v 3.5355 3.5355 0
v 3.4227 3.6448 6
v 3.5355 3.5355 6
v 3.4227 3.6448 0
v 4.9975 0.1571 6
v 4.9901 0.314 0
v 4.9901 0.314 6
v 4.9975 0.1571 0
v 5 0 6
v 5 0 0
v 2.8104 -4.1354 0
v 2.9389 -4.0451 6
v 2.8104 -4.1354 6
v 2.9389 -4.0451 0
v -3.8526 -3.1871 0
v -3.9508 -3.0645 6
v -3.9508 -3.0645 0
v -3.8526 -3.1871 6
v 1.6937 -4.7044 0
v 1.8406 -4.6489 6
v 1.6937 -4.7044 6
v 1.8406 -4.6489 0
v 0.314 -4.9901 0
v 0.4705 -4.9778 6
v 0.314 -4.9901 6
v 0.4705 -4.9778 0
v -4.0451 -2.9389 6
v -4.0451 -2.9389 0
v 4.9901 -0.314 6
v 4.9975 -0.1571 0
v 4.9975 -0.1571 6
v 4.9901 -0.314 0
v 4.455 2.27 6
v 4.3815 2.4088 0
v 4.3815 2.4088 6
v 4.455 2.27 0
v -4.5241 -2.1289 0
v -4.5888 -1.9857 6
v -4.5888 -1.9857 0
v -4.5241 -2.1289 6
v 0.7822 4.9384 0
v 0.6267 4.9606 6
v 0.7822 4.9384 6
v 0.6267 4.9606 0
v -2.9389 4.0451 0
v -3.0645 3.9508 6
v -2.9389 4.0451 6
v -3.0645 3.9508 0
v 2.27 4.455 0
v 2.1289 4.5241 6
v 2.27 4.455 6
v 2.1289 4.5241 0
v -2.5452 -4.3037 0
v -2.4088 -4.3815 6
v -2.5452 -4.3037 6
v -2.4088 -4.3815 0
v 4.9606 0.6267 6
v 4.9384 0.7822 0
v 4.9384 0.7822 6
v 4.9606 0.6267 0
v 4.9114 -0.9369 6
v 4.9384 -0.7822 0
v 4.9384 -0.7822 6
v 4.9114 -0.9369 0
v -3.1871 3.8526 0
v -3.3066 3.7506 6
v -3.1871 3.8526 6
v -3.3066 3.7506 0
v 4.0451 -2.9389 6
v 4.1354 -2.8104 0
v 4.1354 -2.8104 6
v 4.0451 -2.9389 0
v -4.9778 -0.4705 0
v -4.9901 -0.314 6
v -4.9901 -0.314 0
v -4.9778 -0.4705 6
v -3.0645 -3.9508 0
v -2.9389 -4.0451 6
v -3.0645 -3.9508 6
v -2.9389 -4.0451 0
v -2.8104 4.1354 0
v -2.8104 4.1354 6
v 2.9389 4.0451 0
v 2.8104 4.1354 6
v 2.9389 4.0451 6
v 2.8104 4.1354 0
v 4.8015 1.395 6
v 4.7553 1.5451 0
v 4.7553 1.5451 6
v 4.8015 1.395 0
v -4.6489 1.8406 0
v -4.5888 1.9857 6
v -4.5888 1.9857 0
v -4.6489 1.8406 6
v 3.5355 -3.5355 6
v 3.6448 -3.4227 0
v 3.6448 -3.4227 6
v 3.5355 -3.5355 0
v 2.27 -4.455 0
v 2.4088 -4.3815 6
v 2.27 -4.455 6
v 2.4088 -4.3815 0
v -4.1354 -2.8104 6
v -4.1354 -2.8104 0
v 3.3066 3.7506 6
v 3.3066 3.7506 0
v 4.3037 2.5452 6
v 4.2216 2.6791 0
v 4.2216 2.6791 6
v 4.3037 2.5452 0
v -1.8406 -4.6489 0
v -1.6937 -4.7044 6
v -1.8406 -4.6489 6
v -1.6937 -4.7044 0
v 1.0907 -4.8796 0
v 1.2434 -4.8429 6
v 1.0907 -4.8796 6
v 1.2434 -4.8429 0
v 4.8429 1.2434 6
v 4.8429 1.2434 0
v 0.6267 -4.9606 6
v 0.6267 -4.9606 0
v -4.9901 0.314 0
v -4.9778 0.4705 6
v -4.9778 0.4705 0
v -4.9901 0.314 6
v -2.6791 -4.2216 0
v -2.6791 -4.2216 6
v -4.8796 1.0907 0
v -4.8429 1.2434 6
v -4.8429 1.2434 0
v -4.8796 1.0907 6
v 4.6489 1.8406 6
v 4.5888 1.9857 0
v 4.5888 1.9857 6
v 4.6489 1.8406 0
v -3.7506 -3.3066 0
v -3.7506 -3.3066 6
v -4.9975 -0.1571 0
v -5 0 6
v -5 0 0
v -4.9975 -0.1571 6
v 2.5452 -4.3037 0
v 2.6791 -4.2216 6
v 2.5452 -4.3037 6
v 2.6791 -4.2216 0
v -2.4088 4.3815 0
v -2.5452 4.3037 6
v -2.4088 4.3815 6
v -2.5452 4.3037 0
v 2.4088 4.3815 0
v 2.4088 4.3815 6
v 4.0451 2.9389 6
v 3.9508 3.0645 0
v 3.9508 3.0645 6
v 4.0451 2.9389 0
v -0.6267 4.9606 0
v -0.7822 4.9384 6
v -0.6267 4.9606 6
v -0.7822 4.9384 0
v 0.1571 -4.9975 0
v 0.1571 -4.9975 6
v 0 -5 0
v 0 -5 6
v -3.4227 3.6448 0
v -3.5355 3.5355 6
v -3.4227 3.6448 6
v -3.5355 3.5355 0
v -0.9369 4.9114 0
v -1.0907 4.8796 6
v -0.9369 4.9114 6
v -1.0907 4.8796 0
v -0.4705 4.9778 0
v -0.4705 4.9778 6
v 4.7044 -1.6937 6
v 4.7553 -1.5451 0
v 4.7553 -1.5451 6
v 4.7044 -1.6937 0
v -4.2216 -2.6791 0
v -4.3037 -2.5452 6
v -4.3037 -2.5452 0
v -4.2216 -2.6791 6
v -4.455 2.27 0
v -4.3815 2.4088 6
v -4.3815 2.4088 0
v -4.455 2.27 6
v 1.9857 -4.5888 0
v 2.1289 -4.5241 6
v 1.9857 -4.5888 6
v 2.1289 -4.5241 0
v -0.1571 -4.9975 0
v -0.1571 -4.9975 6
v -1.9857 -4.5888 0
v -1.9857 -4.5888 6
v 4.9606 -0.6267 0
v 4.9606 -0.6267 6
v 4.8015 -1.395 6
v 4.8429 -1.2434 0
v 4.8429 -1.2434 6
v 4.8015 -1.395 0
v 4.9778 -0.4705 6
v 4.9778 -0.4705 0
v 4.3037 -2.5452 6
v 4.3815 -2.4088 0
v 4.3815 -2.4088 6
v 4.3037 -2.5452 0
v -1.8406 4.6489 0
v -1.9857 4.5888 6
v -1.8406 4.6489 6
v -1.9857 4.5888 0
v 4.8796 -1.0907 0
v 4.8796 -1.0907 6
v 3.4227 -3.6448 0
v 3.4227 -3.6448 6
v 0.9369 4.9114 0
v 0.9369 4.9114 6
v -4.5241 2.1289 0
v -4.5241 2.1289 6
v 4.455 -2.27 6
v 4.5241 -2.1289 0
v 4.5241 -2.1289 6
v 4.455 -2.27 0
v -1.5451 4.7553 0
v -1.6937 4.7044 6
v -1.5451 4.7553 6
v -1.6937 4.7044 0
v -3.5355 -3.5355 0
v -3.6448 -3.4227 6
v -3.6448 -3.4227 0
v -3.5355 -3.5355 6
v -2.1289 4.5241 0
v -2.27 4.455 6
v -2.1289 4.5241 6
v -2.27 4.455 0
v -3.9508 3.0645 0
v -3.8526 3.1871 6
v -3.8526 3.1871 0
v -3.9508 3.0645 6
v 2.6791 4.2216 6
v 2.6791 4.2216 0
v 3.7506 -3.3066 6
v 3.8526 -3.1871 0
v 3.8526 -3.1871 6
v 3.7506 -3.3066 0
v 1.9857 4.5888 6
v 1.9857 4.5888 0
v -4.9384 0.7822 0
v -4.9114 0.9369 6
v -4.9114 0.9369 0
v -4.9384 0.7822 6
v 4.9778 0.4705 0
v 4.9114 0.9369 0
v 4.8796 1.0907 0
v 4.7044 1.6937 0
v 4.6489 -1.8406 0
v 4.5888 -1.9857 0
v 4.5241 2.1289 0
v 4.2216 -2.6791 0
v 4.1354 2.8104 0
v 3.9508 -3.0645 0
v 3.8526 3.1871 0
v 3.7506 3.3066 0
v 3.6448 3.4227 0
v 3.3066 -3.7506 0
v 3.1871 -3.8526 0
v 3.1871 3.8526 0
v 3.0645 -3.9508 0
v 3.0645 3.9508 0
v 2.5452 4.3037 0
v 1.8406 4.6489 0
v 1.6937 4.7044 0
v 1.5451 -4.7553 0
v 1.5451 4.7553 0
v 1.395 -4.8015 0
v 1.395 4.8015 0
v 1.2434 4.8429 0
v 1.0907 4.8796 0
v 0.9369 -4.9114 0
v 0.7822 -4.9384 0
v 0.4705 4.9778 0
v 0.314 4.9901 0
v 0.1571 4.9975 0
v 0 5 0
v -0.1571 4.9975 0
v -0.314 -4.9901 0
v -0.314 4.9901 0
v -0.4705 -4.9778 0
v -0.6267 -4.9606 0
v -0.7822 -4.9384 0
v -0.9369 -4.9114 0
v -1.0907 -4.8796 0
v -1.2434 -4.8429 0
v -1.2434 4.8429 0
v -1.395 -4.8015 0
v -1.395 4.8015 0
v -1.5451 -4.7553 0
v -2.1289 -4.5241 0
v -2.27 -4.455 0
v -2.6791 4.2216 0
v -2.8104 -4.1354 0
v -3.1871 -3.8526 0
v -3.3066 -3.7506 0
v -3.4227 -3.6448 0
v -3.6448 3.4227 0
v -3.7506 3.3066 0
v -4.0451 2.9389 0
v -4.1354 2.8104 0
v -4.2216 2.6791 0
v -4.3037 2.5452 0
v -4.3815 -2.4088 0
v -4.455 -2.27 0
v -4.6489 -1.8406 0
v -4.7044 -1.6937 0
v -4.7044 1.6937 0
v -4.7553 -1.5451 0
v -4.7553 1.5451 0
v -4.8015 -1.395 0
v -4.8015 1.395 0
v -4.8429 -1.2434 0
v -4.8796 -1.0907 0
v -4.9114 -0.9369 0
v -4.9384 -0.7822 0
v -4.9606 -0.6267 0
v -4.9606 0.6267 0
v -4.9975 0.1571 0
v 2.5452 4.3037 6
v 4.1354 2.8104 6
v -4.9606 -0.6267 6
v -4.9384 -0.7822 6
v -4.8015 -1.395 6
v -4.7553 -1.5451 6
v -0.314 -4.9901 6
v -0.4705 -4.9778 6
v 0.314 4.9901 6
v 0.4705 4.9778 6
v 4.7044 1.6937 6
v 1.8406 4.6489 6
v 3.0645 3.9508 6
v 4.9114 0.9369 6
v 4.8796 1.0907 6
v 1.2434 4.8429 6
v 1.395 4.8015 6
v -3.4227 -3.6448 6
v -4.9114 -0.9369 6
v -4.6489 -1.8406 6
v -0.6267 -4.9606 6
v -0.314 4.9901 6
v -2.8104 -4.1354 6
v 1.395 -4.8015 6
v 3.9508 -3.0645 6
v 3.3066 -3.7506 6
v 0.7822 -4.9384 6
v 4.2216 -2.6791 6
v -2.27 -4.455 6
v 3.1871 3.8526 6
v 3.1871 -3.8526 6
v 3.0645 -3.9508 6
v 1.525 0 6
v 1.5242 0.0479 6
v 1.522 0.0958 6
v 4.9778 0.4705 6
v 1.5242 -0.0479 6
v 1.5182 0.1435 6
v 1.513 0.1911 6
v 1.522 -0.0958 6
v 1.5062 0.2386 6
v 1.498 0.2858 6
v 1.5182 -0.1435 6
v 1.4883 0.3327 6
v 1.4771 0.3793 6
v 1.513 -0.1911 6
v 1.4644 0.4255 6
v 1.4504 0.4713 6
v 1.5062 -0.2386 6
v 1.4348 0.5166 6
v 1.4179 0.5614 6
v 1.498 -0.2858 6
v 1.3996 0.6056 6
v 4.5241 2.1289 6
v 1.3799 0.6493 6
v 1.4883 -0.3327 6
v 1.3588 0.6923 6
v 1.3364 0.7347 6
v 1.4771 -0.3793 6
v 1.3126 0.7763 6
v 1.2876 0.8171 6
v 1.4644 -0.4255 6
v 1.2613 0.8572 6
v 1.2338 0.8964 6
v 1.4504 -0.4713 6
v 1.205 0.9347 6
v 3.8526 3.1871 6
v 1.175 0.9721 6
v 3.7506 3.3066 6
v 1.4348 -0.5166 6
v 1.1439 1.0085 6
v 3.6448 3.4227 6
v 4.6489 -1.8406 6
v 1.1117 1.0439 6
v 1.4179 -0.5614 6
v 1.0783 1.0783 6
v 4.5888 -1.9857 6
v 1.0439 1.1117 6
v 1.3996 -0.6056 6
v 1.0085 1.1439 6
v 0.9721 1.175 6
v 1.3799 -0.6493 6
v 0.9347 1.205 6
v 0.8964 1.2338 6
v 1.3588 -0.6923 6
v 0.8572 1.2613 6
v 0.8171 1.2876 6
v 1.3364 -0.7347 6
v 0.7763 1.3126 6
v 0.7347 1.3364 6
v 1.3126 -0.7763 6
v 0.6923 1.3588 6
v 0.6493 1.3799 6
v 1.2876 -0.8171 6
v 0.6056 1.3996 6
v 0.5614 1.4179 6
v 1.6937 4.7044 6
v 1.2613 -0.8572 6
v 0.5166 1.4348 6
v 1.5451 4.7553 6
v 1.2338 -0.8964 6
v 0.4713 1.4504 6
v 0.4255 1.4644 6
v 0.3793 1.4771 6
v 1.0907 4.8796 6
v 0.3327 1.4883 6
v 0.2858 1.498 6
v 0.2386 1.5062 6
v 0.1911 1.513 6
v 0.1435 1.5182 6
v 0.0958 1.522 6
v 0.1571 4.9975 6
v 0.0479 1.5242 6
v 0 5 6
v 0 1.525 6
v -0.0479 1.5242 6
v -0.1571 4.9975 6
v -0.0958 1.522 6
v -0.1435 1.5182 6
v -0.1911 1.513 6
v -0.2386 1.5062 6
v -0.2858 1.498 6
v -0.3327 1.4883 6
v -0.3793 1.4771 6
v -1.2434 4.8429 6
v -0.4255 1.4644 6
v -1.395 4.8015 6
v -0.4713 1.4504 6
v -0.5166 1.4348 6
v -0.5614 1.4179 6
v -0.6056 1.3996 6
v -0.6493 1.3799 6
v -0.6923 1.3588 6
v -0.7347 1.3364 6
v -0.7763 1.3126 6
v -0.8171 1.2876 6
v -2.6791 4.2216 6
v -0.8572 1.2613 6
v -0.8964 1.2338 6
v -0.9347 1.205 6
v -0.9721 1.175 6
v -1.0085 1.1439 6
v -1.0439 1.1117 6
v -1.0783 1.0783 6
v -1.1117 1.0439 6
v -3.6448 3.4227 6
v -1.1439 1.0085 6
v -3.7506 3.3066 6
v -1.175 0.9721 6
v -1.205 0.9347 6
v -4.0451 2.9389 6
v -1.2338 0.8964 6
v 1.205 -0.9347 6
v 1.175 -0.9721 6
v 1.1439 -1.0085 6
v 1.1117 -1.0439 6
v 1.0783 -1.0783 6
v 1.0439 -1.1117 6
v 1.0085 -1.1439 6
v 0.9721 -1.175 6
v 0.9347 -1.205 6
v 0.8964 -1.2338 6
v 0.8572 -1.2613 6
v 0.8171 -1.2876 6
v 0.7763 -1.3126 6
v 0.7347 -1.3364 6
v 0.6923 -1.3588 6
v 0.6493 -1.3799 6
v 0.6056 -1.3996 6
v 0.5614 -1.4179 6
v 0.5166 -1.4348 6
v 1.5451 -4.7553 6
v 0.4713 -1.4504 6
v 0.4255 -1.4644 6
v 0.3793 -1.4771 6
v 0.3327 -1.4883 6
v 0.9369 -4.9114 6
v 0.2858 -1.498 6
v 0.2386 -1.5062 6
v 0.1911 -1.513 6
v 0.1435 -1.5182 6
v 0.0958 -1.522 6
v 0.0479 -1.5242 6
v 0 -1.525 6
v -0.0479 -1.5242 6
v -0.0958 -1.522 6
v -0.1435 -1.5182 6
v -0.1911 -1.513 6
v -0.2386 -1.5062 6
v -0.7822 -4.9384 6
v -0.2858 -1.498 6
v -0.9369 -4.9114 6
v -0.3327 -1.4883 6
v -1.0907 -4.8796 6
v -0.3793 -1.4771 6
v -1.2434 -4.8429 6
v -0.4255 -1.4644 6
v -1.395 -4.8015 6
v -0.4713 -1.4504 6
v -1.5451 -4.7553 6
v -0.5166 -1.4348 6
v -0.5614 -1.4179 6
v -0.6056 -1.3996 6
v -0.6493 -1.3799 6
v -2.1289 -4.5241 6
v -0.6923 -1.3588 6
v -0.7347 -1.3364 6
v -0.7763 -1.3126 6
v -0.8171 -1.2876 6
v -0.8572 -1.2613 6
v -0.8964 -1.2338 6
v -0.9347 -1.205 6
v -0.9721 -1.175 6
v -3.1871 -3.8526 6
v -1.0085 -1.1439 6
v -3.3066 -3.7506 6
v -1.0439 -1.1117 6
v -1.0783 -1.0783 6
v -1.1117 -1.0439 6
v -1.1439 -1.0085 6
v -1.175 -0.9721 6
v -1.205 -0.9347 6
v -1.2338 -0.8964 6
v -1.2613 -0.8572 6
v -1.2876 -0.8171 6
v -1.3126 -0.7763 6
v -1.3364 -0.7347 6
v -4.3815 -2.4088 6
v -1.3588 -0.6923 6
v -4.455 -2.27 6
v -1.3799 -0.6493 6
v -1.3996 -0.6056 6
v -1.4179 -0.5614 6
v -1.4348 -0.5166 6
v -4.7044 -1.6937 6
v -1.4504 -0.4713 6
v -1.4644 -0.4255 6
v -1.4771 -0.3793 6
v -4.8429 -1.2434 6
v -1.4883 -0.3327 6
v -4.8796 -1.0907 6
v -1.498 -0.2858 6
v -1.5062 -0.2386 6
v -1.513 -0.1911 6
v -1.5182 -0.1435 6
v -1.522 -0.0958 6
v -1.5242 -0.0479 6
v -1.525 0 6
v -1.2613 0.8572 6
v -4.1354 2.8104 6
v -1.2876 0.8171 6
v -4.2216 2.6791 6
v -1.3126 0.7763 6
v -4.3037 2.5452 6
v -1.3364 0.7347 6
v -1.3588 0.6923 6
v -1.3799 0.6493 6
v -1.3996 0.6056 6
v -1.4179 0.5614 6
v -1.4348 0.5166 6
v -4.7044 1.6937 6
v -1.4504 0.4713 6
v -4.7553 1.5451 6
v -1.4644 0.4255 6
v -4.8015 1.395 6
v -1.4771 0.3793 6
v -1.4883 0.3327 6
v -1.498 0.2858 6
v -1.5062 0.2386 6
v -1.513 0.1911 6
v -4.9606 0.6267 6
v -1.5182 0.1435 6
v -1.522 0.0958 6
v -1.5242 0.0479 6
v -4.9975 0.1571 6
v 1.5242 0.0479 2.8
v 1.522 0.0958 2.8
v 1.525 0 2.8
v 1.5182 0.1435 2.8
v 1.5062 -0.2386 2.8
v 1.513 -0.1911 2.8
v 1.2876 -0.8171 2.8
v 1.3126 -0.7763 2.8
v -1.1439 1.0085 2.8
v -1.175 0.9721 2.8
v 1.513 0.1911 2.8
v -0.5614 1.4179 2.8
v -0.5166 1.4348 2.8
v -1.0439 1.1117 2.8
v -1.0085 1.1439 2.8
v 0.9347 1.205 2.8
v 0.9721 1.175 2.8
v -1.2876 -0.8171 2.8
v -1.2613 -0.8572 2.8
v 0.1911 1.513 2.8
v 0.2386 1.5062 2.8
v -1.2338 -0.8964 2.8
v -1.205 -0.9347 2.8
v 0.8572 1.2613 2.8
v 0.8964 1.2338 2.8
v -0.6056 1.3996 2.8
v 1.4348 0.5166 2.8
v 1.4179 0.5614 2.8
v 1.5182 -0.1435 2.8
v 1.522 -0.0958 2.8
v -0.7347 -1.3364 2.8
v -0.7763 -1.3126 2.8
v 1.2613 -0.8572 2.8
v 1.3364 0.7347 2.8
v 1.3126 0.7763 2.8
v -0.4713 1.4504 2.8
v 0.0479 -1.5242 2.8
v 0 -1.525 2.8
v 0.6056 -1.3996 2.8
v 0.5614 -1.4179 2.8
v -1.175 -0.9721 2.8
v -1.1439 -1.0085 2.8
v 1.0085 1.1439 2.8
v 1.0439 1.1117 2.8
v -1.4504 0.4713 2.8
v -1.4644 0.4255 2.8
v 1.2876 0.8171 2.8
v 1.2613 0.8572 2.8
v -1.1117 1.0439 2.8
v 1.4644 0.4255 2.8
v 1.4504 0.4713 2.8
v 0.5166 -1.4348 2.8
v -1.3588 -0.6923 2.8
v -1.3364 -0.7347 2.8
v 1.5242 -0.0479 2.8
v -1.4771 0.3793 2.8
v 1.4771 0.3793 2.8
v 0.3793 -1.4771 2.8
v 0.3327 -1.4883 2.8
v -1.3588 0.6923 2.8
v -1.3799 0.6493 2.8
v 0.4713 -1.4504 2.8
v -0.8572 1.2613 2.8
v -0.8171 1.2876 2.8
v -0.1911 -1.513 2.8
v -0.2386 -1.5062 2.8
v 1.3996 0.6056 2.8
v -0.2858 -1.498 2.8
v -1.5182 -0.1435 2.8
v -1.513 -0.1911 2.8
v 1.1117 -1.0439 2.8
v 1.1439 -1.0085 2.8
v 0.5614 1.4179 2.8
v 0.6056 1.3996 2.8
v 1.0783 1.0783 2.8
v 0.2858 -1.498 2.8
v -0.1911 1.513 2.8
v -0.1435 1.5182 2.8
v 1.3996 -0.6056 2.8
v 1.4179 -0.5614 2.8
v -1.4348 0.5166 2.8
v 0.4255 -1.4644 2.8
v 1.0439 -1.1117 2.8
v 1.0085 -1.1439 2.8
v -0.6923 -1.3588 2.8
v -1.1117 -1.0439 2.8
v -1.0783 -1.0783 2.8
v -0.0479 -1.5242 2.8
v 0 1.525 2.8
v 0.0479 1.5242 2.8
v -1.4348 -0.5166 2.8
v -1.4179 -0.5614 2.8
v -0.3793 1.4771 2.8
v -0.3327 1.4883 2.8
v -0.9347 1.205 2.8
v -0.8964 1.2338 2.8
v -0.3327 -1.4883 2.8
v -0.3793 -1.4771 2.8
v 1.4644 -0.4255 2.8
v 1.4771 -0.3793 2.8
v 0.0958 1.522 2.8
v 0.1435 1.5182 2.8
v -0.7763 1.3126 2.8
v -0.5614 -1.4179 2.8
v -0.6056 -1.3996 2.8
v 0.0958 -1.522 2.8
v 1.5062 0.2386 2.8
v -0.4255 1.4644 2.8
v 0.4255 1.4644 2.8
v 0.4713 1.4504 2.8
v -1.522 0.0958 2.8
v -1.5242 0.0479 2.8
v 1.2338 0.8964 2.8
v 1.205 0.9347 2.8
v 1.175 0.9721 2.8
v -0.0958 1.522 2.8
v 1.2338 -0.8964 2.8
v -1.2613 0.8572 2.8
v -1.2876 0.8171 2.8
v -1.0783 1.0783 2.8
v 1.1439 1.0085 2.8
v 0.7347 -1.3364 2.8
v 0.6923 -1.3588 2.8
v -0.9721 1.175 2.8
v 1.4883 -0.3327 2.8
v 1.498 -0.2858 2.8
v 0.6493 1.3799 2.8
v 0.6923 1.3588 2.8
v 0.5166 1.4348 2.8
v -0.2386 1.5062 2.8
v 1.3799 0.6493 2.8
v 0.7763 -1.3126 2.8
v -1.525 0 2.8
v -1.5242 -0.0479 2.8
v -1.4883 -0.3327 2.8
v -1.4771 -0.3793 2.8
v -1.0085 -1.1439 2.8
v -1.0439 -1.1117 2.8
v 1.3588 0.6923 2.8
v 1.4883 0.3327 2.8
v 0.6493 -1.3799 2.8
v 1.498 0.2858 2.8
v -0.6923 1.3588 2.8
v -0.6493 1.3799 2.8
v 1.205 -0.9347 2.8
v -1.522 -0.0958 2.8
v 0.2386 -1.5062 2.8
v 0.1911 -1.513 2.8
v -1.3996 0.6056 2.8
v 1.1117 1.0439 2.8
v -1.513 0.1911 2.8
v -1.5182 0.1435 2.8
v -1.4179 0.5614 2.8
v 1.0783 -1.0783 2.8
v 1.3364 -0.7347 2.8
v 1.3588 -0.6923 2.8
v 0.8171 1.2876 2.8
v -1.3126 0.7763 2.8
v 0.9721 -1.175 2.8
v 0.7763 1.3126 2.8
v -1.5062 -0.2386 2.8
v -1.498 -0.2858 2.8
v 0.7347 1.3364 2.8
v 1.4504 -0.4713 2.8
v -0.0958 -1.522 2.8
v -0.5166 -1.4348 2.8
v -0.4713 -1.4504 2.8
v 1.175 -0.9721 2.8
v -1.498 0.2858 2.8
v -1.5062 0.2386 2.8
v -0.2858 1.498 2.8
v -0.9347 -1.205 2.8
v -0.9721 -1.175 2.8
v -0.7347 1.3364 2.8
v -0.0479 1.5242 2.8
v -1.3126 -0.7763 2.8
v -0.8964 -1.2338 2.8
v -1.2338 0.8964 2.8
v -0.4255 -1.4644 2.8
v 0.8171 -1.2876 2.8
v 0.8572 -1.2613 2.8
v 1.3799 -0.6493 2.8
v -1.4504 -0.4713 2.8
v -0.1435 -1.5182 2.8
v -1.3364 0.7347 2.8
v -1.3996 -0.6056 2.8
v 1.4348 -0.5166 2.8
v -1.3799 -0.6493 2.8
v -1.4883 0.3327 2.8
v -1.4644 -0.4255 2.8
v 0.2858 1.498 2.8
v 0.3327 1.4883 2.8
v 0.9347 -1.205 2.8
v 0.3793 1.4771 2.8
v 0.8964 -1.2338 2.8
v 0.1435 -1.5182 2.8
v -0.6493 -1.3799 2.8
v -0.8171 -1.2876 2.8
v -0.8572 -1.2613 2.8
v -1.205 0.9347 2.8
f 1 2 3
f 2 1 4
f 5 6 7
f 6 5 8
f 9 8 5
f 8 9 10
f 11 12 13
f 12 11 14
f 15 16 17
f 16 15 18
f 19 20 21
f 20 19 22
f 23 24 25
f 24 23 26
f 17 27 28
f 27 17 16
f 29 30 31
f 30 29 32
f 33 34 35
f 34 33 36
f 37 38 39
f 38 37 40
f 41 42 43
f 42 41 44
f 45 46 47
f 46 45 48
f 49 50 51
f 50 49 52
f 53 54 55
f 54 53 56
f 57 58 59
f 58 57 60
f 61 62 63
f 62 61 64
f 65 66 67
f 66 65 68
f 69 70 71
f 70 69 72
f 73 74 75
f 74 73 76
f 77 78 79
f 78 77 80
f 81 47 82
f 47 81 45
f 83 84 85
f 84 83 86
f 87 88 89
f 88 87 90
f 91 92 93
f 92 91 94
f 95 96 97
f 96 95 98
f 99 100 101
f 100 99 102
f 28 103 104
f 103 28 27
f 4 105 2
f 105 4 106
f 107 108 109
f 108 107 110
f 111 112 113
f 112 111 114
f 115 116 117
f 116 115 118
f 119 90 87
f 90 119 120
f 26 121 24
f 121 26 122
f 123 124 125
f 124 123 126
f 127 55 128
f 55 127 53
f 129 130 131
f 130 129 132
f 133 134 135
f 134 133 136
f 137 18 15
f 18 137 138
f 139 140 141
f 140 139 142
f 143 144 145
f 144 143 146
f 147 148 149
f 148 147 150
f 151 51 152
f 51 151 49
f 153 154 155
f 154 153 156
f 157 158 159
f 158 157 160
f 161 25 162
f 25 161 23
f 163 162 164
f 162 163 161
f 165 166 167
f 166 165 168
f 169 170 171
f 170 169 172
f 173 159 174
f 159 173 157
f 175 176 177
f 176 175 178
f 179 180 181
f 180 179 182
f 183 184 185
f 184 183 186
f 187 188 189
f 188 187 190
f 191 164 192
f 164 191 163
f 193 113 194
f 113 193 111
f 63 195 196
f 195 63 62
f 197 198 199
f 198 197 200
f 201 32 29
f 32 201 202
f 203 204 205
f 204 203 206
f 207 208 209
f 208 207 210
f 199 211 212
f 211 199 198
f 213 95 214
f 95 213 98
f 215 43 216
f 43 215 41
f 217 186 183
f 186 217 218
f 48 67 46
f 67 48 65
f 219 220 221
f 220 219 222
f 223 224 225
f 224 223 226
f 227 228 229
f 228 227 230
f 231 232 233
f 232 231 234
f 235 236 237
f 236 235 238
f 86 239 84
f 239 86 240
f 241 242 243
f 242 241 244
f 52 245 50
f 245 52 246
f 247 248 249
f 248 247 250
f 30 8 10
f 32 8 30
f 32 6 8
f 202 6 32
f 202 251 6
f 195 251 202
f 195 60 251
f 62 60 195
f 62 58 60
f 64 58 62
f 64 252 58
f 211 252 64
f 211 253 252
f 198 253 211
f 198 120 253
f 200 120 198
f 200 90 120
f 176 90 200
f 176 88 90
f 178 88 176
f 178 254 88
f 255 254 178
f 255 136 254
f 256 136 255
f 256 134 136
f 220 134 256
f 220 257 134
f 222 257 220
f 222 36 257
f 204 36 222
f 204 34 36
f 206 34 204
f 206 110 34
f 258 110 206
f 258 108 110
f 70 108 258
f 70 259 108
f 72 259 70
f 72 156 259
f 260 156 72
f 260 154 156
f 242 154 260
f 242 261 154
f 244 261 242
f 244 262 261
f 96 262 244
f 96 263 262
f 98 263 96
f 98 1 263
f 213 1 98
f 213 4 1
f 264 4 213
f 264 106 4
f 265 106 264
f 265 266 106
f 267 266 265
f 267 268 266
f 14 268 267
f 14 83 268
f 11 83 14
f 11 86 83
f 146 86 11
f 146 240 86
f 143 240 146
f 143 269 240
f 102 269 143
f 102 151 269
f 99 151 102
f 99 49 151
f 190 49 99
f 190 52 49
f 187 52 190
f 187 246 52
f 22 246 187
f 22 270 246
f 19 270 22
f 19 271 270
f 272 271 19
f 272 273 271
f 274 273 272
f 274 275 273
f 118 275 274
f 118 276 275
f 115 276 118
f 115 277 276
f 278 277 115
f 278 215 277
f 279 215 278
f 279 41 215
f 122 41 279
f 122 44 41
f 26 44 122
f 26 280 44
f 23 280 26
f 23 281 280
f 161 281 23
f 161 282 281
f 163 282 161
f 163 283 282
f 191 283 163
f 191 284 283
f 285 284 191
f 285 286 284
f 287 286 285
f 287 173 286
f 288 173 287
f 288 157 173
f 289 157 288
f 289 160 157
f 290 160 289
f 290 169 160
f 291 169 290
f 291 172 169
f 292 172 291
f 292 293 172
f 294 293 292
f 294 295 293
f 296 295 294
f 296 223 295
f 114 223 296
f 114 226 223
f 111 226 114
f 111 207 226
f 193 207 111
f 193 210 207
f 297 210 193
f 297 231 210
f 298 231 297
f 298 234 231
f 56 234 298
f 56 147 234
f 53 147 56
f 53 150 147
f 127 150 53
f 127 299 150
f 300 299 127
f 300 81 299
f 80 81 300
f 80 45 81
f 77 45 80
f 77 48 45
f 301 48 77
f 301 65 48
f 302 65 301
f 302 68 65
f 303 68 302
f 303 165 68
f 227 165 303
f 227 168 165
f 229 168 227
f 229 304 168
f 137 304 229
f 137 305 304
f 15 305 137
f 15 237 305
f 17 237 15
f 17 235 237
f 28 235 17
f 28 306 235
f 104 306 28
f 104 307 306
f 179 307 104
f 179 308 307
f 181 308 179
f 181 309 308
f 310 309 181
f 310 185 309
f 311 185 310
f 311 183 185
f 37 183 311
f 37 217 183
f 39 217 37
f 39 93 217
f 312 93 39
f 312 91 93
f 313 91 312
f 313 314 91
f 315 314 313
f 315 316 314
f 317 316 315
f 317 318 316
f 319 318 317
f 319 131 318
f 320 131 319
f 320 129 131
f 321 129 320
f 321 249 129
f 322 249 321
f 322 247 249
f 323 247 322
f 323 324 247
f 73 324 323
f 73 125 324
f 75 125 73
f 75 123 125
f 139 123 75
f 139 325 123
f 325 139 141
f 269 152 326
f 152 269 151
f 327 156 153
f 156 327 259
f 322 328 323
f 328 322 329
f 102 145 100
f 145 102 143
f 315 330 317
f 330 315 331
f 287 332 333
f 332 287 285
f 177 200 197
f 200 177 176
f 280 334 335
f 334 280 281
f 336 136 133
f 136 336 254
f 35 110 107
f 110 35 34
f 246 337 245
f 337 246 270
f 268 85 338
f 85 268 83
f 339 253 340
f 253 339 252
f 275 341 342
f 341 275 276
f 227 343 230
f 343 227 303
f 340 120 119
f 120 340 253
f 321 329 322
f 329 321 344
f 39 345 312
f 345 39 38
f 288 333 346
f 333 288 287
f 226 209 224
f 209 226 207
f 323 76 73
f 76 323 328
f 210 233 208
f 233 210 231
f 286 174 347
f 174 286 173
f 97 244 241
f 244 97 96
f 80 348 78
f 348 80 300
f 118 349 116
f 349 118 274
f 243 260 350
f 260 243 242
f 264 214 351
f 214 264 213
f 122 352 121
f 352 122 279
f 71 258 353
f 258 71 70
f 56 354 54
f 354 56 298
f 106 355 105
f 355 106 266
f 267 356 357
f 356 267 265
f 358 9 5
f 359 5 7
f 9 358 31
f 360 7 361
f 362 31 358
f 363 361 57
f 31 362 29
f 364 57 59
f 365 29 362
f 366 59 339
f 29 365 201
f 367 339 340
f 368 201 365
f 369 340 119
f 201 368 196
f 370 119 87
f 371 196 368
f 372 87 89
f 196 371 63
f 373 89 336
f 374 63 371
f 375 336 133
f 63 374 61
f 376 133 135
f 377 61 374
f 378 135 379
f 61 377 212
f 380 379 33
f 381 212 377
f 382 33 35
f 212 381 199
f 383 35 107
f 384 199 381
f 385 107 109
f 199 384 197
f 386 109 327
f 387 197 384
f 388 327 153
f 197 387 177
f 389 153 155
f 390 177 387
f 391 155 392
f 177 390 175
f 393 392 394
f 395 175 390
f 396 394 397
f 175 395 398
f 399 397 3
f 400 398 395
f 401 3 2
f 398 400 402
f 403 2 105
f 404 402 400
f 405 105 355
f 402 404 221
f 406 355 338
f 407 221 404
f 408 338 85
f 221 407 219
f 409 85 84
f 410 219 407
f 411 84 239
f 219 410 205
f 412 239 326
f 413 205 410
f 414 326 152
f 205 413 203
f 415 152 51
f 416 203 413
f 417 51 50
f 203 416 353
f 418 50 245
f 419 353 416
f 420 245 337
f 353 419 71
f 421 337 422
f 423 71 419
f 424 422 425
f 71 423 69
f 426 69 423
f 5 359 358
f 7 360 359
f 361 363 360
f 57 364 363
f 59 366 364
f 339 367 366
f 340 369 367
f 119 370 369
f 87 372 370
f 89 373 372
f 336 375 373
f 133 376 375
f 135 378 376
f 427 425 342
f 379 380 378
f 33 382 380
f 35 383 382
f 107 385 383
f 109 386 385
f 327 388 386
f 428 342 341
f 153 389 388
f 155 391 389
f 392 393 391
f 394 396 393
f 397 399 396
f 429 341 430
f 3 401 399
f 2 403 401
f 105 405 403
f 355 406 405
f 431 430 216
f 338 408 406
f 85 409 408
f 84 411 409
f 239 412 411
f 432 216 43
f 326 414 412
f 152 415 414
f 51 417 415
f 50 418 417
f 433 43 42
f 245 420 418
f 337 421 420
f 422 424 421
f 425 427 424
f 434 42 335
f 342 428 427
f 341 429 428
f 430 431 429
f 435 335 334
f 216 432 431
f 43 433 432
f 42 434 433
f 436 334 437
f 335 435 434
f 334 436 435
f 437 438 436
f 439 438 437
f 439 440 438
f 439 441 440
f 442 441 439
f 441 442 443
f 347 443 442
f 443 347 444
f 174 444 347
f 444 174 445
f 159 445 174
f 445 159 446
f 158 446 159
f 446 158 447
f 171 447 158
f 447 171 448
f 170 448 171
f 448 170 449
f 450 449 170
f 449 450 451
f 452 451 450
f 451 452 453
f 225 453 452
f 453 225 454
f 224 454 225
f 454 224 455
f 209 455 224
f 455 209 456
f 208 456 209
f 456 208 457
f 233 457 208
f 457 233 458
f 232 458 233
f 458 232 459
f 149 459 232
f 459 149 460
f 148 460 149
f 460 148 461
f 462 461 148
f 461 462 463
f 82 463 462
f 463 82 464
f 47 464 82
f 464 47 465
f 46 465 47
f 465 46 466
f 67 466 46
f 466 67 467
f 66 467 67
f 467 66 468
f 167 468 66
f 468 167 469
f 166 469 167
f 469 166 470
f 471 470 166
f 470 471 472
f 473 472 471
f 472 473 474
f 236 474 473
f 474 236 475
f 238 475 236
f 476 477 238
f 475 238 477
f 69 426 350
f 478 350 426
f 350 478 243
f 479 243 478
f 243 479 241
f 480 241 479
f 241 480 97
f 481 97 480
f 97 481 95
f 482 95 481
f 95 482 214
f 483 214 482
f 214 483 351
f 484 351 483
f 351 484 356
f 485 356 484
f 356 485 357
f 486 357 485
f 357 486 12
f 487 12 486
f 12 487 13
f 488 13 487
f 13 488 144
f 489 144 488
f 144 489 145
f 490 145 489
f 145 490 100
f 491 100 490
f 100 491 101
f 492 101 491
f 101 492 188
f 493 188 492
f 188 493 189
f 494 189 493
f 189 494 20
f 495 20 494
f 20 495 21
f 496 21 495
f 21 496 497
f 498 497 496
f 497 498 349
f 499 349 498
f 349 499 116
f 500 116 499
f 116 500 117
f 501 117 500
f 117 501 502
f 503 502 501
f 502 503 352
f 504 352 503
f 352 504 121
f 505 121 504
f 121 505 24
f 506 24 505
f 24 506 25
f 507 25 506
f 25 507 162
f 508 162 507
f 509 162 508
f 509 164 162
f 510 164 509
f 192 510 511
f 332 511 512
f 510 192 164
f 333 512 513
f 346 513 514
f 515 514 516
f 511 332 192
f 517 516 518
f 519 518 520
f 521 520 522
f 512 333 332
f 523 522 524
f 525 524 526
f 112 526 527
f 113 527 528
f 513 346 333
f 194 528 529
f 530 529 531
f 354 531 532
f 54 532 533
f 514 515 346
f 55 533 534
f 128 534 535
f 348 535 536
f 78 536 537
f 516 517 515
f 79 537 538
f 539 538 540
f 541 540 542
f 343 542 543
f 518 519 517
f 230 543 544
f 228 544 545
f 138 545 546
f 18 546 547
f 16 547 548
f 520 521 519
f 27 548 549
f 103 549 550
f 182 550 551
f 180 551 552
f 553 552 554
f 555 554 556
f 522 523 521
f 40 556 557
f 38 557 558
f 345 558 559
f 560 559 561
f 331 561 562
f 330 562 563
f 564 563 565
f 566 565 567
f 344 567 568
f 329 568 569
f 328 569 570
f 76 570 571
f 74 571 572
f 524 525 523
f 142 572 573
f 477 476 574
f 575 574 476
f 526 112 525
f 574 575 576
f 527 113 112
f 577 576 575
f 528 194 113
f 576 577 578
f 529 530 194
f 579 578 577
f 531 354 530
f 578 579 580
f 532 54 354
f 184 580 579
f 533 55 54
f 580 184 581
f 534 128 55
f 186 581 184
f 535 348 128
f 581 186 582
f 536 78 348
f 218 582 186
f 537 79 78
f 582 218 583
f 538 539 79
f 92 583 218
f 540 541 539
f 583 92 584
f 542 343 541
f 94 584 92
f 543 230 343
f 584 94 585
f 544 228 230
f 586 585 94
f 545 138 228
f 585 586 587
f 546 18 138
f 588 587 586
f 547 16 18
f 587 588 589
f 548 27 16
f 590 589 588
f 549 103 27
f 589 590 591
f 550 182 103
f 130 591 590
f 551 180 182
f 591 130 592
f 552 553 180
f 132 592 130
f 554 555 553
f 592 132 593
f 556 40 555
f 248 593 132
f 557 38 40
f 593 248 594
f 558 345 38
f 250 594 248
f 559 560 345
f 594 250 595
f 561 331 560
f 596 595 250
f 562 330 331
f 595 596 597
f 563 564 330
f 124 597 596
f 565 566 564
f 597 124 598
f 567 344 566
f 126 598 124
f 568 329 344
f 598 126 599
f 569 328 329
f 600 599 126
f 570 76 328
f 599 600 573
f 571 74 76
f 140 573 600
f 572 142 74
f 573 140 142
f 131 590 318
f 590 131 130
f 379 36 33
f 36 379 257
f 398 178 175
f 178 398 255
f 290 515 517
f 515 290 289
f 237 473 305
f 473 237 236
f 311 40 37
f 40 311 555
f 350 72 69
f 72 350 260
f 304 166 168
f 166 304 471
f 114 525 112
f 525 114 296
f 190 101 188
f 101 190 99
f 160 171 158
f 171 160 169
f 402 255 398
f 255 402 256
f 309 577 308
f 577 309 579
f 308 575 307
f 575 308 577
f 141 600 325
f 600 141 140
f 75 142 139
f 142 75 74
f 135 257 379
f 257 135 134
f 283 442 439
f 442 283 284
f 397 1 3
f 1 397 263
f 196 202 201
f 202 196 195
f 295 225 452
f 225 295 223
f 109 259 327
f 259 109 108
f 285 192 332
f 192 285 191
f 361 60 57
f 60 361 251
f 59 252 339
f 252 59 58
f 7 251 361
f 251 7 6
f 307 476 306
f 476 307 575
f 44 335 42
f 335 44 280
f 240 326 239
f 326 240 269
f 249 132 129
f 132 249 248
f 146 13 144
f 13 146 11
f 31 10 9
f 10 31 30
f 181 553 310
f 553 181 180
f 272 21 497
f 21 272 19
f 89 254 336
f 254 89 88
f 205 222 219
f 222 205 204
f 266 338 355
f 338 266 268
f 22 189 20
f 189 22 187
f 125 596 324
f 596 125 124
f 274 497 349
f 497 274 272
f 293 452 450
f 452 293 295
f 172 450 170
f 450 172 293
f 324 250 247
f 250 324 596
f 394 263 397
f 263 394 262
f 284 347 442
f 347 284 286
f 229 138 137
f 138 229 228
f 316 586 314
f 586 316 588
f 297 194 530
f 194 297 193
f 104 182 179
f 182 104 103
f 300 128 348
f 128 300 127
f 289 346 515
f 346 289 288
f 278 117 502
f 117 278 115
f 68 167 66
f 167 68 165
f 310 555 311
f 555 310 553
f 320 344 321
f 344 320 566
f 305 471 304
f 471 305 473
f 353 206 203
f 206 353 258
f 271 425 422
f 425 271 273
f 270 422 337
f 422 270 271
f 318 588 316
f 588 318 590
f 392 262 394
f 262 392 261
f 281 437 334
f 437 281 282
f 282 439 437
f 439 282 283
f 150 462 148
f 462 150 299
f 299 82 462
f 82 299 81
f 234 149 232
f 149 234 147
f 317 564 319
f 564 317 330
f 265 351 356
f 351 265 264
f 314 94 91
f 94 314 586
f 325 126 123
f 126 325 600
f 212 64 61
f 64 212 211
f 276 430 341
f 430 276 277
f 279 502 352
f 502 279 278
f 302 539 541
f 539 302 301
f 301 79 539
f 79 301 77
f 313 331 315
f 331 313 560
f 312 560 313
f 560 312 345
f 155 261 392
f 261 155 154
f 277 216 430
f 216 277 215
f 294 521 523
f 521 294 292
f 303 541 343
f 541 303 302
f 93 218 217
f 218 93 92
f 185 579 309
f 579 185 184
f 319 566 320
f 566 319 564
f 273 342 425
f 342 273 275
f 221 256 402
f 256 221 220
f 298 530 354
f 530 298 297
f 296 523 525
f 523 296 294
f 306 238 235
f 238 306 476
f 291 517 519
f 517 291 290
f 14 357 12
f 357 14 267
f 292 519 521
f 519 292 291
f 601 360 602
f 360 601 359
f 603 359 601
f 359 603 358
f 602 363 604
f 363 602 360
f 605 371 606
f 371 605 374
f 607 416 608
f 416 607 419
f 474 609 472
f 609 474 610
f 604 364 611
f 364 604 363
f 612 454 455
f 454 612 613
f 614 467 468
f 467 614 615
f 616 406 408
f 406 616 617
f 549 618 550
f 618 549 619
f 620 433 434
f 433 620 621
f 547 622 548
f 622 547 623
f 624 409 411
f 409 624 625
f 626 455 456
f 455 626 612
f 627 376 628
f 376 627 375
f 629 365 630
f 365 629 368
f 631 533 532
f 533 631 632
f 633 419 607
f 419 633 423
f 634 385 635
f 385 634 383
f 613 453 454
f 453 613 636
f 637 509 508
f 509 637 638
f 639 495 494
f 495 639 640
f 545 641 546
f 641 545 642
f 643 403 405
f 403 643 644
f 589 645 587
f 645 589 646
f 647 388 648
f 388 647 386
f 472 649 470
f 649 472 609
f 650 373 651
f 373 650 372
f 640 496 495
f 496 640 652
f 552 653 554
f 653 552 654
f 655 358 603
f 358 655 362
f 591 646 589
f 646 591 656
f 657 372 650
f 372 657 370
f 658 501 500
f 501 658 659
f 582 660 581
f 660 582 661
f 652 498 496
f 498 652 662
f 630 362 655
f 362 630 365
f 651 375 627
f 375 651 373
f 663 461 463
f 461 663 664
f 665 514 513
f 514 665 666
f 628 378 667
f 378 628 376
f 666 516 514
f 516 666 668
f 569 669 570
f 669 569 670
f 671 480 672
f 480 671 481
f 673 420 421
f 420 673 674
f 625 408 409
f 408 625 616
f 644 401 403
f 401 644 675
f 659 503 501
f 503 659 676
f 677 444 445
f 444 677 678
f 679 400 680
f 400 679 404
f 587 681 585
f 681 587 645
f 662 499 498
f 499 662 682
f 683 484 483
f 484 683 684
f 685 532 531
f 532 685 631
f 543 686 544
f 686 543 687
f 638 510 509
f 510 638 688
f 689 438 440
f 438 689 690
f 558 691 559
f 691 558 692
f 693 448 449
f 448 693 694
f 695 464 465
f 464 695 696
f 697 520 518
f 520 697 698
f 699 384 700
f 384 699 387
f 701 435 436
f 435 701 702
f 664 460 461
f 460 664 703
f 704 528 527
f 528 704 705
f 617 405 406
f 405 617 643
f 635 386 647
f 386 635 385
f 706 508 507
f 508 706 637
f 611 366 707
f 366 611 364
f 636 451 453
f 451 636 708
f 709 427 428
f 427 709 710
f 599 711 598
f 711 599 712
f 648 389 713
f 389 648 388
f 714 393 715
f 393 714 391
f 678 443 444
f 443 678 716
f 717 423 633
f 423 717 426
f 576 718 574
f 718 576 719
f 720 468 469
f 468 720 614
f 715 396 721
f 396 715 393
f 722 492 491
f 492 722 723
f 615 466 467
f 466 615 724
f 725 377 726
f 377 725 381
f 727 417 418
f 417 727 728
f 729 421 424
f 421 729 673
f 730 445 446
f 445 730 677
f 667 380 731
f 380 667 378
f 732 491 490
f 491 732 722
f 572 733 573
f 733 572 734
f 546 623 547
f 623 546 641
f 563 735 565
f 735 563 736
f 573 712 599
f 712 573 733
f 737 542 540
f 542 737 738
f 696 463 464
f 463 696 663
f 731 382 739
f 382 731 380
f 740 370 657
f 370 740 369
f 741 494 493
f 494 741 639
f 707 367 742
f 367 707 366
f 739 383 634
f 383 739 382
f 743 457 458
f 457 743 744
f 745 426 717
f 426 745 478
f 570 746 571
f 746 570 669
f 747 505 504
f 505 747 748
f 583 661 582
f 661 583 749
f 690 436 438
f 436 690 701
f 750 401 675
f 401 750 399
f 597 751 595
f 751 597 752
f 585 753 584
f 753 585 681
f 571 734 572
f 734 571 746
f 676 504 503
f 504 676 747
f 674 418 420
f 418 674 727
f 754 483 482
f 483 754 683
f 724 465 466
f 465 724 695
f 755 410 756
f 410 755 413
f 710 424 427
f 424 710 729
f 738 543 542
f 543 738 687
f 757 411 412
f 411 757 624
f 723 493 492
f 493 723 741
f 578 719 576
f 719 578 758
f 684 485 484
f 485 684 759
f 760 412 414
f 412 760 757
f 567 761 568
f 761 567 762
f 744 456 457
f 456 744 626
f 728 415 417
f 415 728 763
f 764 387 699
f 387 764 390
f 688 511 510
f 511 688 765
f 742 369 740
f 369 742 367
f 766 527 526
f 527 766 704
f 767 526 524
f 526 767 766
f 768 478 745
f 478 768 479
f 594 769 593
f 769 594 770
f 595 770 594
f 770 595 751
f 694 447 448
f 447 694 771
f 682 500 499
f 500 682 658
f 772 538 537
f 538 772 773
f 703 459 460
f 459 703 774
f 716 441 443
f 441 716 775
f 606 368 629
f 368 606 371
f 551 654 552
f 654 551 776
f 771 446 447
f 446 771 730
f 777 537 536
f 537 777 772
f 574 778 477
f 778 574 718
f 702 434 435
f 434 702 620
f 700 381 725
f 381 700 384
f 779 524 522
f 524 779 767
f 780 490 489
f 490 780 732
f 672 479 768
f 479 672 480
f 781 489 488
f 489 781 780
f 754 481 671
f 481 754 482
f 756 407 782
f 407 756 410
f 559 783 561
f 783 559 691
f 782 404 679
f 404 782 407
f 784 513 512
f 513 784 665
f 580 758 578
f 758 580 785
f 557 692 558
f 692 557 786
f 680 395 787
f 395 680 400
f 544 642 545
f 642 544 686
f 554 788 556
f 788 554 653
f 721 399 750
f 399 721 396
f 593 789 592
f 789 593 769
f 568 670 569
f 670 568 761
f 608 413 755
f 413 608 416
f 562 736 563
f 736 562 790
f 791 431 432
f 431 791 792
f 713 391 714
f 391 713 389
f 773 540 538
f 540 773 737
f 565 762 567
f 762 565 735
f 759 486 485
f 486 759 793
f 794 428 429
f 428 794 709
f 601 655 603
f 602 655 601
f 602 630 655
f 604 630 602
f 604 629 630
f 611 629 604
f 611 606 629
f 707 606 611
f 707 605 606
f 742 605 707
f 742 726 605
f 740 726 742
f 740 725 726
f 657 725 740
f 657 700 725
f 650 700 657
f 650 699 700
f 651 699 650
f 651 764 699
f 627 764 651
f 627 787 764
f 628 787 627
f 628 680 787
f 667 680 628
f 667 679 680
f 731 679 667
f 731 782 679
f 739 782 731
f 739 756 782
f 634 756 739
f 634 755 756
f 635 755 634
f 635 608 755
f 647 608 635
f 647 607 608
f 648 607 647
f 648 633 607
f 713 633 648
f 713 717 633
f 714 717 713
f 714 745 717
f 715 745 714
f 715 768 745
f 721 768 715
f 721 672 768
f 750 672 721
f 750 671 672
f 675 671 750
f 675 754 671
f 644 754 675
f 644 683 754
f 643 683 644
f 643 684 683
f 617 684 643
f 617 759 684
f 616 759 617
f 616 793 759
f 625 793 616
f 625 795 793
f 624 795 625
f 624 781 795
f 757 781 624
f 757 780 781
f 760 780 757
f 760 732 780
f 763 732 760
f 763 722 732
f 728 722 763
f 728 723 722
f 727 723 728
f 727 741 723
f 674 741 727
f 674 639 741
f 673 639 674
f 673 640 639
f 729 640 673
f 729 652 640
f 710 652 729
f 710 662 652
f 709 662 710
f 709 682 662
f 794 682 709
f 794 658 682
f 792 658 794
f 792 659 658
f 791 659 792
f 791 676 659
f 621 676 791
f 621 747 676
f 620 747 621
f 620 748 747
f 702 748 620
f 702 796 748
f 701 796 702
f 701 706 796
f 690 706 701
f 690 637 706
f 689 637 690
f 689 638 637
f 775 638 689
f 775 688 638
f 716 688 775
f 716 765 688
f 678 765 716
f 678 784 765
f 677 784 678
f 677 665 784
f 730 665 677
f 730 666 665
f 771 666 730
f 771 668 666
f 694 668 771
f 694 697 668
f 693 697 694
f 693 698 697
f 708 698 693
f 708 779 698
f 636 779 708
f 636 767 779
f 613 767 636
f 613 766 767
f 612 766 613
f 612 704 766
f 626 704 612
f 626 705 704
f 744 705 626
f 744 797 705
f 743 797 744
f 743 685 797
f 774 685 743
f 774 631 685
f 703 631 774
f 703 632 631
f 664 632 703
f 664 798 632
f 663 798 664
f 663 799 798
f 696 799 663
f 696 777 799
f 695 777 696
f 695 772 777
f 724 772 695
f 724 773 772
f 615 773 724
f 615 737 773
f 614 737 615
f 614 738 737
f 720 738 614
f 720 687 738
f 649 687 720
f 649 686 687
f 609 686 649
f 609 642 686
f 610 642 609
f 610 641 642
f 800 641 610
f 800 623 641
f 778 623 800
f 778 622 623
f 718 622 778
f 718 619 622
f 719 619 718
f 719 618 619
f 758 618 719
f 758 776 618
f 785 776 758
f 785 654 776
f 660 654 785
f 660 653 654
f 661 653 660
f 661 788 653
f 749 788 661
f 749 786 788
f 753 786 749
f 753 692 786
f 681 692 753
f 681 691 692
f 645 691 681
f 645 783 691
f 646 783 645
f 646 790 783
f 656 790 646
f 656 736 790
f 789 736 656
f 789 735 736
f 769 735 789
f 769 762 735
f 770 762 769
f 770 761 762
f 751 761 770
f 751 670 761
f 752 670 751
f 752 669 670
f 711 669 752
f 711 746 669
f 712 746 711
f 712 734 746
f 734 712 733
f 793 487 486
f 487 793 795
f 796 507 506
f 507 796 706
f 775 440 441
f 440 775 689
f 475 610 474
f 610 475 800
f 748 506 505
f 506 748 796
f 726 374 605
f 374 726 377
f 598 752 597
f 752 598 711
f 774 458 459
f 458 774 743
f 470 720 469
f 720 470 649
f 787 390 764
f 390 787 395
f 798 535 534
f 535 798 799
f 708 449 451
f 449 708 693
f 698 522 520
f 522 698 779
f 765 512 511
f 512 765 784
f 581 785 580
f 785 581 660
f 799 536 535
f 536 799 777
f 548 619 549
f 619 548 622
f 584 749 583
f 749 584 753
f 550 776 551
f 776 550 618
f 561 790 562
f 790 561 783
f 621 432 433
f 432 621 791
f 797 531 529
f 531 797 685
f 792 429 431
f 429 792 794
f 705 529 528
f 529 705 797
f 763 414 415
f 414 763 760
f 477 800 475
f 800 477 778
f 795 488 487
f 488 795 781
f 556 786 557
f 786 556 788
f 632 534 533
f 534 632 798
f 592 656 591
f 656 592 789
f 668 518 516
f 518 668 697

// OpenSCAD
height=6;
diameter=10;
hole_height=3.2;
hole_diameter=3.05;


/* [Animation] */
// resolution
$fn=200;

/* [Animation] */
// rotating animation
animation_rotation = false;

/* [Hidden] */
is_animated = animation_rotation;
$vpt = is_animated?[0, 0, 0]:$vpt;
$vpr = is_animated?[60, 0, animation_rotation?(365 * $t):45]:$vpr;  // animation rotate around the object
$vpd = is_animated?200:$vpd;

difference() {
    cylinder(h=height, d=diameter);
    translate([0,0,height-hole_height])
        cylinder(h=hole_height, d=hole_diameter);
}
